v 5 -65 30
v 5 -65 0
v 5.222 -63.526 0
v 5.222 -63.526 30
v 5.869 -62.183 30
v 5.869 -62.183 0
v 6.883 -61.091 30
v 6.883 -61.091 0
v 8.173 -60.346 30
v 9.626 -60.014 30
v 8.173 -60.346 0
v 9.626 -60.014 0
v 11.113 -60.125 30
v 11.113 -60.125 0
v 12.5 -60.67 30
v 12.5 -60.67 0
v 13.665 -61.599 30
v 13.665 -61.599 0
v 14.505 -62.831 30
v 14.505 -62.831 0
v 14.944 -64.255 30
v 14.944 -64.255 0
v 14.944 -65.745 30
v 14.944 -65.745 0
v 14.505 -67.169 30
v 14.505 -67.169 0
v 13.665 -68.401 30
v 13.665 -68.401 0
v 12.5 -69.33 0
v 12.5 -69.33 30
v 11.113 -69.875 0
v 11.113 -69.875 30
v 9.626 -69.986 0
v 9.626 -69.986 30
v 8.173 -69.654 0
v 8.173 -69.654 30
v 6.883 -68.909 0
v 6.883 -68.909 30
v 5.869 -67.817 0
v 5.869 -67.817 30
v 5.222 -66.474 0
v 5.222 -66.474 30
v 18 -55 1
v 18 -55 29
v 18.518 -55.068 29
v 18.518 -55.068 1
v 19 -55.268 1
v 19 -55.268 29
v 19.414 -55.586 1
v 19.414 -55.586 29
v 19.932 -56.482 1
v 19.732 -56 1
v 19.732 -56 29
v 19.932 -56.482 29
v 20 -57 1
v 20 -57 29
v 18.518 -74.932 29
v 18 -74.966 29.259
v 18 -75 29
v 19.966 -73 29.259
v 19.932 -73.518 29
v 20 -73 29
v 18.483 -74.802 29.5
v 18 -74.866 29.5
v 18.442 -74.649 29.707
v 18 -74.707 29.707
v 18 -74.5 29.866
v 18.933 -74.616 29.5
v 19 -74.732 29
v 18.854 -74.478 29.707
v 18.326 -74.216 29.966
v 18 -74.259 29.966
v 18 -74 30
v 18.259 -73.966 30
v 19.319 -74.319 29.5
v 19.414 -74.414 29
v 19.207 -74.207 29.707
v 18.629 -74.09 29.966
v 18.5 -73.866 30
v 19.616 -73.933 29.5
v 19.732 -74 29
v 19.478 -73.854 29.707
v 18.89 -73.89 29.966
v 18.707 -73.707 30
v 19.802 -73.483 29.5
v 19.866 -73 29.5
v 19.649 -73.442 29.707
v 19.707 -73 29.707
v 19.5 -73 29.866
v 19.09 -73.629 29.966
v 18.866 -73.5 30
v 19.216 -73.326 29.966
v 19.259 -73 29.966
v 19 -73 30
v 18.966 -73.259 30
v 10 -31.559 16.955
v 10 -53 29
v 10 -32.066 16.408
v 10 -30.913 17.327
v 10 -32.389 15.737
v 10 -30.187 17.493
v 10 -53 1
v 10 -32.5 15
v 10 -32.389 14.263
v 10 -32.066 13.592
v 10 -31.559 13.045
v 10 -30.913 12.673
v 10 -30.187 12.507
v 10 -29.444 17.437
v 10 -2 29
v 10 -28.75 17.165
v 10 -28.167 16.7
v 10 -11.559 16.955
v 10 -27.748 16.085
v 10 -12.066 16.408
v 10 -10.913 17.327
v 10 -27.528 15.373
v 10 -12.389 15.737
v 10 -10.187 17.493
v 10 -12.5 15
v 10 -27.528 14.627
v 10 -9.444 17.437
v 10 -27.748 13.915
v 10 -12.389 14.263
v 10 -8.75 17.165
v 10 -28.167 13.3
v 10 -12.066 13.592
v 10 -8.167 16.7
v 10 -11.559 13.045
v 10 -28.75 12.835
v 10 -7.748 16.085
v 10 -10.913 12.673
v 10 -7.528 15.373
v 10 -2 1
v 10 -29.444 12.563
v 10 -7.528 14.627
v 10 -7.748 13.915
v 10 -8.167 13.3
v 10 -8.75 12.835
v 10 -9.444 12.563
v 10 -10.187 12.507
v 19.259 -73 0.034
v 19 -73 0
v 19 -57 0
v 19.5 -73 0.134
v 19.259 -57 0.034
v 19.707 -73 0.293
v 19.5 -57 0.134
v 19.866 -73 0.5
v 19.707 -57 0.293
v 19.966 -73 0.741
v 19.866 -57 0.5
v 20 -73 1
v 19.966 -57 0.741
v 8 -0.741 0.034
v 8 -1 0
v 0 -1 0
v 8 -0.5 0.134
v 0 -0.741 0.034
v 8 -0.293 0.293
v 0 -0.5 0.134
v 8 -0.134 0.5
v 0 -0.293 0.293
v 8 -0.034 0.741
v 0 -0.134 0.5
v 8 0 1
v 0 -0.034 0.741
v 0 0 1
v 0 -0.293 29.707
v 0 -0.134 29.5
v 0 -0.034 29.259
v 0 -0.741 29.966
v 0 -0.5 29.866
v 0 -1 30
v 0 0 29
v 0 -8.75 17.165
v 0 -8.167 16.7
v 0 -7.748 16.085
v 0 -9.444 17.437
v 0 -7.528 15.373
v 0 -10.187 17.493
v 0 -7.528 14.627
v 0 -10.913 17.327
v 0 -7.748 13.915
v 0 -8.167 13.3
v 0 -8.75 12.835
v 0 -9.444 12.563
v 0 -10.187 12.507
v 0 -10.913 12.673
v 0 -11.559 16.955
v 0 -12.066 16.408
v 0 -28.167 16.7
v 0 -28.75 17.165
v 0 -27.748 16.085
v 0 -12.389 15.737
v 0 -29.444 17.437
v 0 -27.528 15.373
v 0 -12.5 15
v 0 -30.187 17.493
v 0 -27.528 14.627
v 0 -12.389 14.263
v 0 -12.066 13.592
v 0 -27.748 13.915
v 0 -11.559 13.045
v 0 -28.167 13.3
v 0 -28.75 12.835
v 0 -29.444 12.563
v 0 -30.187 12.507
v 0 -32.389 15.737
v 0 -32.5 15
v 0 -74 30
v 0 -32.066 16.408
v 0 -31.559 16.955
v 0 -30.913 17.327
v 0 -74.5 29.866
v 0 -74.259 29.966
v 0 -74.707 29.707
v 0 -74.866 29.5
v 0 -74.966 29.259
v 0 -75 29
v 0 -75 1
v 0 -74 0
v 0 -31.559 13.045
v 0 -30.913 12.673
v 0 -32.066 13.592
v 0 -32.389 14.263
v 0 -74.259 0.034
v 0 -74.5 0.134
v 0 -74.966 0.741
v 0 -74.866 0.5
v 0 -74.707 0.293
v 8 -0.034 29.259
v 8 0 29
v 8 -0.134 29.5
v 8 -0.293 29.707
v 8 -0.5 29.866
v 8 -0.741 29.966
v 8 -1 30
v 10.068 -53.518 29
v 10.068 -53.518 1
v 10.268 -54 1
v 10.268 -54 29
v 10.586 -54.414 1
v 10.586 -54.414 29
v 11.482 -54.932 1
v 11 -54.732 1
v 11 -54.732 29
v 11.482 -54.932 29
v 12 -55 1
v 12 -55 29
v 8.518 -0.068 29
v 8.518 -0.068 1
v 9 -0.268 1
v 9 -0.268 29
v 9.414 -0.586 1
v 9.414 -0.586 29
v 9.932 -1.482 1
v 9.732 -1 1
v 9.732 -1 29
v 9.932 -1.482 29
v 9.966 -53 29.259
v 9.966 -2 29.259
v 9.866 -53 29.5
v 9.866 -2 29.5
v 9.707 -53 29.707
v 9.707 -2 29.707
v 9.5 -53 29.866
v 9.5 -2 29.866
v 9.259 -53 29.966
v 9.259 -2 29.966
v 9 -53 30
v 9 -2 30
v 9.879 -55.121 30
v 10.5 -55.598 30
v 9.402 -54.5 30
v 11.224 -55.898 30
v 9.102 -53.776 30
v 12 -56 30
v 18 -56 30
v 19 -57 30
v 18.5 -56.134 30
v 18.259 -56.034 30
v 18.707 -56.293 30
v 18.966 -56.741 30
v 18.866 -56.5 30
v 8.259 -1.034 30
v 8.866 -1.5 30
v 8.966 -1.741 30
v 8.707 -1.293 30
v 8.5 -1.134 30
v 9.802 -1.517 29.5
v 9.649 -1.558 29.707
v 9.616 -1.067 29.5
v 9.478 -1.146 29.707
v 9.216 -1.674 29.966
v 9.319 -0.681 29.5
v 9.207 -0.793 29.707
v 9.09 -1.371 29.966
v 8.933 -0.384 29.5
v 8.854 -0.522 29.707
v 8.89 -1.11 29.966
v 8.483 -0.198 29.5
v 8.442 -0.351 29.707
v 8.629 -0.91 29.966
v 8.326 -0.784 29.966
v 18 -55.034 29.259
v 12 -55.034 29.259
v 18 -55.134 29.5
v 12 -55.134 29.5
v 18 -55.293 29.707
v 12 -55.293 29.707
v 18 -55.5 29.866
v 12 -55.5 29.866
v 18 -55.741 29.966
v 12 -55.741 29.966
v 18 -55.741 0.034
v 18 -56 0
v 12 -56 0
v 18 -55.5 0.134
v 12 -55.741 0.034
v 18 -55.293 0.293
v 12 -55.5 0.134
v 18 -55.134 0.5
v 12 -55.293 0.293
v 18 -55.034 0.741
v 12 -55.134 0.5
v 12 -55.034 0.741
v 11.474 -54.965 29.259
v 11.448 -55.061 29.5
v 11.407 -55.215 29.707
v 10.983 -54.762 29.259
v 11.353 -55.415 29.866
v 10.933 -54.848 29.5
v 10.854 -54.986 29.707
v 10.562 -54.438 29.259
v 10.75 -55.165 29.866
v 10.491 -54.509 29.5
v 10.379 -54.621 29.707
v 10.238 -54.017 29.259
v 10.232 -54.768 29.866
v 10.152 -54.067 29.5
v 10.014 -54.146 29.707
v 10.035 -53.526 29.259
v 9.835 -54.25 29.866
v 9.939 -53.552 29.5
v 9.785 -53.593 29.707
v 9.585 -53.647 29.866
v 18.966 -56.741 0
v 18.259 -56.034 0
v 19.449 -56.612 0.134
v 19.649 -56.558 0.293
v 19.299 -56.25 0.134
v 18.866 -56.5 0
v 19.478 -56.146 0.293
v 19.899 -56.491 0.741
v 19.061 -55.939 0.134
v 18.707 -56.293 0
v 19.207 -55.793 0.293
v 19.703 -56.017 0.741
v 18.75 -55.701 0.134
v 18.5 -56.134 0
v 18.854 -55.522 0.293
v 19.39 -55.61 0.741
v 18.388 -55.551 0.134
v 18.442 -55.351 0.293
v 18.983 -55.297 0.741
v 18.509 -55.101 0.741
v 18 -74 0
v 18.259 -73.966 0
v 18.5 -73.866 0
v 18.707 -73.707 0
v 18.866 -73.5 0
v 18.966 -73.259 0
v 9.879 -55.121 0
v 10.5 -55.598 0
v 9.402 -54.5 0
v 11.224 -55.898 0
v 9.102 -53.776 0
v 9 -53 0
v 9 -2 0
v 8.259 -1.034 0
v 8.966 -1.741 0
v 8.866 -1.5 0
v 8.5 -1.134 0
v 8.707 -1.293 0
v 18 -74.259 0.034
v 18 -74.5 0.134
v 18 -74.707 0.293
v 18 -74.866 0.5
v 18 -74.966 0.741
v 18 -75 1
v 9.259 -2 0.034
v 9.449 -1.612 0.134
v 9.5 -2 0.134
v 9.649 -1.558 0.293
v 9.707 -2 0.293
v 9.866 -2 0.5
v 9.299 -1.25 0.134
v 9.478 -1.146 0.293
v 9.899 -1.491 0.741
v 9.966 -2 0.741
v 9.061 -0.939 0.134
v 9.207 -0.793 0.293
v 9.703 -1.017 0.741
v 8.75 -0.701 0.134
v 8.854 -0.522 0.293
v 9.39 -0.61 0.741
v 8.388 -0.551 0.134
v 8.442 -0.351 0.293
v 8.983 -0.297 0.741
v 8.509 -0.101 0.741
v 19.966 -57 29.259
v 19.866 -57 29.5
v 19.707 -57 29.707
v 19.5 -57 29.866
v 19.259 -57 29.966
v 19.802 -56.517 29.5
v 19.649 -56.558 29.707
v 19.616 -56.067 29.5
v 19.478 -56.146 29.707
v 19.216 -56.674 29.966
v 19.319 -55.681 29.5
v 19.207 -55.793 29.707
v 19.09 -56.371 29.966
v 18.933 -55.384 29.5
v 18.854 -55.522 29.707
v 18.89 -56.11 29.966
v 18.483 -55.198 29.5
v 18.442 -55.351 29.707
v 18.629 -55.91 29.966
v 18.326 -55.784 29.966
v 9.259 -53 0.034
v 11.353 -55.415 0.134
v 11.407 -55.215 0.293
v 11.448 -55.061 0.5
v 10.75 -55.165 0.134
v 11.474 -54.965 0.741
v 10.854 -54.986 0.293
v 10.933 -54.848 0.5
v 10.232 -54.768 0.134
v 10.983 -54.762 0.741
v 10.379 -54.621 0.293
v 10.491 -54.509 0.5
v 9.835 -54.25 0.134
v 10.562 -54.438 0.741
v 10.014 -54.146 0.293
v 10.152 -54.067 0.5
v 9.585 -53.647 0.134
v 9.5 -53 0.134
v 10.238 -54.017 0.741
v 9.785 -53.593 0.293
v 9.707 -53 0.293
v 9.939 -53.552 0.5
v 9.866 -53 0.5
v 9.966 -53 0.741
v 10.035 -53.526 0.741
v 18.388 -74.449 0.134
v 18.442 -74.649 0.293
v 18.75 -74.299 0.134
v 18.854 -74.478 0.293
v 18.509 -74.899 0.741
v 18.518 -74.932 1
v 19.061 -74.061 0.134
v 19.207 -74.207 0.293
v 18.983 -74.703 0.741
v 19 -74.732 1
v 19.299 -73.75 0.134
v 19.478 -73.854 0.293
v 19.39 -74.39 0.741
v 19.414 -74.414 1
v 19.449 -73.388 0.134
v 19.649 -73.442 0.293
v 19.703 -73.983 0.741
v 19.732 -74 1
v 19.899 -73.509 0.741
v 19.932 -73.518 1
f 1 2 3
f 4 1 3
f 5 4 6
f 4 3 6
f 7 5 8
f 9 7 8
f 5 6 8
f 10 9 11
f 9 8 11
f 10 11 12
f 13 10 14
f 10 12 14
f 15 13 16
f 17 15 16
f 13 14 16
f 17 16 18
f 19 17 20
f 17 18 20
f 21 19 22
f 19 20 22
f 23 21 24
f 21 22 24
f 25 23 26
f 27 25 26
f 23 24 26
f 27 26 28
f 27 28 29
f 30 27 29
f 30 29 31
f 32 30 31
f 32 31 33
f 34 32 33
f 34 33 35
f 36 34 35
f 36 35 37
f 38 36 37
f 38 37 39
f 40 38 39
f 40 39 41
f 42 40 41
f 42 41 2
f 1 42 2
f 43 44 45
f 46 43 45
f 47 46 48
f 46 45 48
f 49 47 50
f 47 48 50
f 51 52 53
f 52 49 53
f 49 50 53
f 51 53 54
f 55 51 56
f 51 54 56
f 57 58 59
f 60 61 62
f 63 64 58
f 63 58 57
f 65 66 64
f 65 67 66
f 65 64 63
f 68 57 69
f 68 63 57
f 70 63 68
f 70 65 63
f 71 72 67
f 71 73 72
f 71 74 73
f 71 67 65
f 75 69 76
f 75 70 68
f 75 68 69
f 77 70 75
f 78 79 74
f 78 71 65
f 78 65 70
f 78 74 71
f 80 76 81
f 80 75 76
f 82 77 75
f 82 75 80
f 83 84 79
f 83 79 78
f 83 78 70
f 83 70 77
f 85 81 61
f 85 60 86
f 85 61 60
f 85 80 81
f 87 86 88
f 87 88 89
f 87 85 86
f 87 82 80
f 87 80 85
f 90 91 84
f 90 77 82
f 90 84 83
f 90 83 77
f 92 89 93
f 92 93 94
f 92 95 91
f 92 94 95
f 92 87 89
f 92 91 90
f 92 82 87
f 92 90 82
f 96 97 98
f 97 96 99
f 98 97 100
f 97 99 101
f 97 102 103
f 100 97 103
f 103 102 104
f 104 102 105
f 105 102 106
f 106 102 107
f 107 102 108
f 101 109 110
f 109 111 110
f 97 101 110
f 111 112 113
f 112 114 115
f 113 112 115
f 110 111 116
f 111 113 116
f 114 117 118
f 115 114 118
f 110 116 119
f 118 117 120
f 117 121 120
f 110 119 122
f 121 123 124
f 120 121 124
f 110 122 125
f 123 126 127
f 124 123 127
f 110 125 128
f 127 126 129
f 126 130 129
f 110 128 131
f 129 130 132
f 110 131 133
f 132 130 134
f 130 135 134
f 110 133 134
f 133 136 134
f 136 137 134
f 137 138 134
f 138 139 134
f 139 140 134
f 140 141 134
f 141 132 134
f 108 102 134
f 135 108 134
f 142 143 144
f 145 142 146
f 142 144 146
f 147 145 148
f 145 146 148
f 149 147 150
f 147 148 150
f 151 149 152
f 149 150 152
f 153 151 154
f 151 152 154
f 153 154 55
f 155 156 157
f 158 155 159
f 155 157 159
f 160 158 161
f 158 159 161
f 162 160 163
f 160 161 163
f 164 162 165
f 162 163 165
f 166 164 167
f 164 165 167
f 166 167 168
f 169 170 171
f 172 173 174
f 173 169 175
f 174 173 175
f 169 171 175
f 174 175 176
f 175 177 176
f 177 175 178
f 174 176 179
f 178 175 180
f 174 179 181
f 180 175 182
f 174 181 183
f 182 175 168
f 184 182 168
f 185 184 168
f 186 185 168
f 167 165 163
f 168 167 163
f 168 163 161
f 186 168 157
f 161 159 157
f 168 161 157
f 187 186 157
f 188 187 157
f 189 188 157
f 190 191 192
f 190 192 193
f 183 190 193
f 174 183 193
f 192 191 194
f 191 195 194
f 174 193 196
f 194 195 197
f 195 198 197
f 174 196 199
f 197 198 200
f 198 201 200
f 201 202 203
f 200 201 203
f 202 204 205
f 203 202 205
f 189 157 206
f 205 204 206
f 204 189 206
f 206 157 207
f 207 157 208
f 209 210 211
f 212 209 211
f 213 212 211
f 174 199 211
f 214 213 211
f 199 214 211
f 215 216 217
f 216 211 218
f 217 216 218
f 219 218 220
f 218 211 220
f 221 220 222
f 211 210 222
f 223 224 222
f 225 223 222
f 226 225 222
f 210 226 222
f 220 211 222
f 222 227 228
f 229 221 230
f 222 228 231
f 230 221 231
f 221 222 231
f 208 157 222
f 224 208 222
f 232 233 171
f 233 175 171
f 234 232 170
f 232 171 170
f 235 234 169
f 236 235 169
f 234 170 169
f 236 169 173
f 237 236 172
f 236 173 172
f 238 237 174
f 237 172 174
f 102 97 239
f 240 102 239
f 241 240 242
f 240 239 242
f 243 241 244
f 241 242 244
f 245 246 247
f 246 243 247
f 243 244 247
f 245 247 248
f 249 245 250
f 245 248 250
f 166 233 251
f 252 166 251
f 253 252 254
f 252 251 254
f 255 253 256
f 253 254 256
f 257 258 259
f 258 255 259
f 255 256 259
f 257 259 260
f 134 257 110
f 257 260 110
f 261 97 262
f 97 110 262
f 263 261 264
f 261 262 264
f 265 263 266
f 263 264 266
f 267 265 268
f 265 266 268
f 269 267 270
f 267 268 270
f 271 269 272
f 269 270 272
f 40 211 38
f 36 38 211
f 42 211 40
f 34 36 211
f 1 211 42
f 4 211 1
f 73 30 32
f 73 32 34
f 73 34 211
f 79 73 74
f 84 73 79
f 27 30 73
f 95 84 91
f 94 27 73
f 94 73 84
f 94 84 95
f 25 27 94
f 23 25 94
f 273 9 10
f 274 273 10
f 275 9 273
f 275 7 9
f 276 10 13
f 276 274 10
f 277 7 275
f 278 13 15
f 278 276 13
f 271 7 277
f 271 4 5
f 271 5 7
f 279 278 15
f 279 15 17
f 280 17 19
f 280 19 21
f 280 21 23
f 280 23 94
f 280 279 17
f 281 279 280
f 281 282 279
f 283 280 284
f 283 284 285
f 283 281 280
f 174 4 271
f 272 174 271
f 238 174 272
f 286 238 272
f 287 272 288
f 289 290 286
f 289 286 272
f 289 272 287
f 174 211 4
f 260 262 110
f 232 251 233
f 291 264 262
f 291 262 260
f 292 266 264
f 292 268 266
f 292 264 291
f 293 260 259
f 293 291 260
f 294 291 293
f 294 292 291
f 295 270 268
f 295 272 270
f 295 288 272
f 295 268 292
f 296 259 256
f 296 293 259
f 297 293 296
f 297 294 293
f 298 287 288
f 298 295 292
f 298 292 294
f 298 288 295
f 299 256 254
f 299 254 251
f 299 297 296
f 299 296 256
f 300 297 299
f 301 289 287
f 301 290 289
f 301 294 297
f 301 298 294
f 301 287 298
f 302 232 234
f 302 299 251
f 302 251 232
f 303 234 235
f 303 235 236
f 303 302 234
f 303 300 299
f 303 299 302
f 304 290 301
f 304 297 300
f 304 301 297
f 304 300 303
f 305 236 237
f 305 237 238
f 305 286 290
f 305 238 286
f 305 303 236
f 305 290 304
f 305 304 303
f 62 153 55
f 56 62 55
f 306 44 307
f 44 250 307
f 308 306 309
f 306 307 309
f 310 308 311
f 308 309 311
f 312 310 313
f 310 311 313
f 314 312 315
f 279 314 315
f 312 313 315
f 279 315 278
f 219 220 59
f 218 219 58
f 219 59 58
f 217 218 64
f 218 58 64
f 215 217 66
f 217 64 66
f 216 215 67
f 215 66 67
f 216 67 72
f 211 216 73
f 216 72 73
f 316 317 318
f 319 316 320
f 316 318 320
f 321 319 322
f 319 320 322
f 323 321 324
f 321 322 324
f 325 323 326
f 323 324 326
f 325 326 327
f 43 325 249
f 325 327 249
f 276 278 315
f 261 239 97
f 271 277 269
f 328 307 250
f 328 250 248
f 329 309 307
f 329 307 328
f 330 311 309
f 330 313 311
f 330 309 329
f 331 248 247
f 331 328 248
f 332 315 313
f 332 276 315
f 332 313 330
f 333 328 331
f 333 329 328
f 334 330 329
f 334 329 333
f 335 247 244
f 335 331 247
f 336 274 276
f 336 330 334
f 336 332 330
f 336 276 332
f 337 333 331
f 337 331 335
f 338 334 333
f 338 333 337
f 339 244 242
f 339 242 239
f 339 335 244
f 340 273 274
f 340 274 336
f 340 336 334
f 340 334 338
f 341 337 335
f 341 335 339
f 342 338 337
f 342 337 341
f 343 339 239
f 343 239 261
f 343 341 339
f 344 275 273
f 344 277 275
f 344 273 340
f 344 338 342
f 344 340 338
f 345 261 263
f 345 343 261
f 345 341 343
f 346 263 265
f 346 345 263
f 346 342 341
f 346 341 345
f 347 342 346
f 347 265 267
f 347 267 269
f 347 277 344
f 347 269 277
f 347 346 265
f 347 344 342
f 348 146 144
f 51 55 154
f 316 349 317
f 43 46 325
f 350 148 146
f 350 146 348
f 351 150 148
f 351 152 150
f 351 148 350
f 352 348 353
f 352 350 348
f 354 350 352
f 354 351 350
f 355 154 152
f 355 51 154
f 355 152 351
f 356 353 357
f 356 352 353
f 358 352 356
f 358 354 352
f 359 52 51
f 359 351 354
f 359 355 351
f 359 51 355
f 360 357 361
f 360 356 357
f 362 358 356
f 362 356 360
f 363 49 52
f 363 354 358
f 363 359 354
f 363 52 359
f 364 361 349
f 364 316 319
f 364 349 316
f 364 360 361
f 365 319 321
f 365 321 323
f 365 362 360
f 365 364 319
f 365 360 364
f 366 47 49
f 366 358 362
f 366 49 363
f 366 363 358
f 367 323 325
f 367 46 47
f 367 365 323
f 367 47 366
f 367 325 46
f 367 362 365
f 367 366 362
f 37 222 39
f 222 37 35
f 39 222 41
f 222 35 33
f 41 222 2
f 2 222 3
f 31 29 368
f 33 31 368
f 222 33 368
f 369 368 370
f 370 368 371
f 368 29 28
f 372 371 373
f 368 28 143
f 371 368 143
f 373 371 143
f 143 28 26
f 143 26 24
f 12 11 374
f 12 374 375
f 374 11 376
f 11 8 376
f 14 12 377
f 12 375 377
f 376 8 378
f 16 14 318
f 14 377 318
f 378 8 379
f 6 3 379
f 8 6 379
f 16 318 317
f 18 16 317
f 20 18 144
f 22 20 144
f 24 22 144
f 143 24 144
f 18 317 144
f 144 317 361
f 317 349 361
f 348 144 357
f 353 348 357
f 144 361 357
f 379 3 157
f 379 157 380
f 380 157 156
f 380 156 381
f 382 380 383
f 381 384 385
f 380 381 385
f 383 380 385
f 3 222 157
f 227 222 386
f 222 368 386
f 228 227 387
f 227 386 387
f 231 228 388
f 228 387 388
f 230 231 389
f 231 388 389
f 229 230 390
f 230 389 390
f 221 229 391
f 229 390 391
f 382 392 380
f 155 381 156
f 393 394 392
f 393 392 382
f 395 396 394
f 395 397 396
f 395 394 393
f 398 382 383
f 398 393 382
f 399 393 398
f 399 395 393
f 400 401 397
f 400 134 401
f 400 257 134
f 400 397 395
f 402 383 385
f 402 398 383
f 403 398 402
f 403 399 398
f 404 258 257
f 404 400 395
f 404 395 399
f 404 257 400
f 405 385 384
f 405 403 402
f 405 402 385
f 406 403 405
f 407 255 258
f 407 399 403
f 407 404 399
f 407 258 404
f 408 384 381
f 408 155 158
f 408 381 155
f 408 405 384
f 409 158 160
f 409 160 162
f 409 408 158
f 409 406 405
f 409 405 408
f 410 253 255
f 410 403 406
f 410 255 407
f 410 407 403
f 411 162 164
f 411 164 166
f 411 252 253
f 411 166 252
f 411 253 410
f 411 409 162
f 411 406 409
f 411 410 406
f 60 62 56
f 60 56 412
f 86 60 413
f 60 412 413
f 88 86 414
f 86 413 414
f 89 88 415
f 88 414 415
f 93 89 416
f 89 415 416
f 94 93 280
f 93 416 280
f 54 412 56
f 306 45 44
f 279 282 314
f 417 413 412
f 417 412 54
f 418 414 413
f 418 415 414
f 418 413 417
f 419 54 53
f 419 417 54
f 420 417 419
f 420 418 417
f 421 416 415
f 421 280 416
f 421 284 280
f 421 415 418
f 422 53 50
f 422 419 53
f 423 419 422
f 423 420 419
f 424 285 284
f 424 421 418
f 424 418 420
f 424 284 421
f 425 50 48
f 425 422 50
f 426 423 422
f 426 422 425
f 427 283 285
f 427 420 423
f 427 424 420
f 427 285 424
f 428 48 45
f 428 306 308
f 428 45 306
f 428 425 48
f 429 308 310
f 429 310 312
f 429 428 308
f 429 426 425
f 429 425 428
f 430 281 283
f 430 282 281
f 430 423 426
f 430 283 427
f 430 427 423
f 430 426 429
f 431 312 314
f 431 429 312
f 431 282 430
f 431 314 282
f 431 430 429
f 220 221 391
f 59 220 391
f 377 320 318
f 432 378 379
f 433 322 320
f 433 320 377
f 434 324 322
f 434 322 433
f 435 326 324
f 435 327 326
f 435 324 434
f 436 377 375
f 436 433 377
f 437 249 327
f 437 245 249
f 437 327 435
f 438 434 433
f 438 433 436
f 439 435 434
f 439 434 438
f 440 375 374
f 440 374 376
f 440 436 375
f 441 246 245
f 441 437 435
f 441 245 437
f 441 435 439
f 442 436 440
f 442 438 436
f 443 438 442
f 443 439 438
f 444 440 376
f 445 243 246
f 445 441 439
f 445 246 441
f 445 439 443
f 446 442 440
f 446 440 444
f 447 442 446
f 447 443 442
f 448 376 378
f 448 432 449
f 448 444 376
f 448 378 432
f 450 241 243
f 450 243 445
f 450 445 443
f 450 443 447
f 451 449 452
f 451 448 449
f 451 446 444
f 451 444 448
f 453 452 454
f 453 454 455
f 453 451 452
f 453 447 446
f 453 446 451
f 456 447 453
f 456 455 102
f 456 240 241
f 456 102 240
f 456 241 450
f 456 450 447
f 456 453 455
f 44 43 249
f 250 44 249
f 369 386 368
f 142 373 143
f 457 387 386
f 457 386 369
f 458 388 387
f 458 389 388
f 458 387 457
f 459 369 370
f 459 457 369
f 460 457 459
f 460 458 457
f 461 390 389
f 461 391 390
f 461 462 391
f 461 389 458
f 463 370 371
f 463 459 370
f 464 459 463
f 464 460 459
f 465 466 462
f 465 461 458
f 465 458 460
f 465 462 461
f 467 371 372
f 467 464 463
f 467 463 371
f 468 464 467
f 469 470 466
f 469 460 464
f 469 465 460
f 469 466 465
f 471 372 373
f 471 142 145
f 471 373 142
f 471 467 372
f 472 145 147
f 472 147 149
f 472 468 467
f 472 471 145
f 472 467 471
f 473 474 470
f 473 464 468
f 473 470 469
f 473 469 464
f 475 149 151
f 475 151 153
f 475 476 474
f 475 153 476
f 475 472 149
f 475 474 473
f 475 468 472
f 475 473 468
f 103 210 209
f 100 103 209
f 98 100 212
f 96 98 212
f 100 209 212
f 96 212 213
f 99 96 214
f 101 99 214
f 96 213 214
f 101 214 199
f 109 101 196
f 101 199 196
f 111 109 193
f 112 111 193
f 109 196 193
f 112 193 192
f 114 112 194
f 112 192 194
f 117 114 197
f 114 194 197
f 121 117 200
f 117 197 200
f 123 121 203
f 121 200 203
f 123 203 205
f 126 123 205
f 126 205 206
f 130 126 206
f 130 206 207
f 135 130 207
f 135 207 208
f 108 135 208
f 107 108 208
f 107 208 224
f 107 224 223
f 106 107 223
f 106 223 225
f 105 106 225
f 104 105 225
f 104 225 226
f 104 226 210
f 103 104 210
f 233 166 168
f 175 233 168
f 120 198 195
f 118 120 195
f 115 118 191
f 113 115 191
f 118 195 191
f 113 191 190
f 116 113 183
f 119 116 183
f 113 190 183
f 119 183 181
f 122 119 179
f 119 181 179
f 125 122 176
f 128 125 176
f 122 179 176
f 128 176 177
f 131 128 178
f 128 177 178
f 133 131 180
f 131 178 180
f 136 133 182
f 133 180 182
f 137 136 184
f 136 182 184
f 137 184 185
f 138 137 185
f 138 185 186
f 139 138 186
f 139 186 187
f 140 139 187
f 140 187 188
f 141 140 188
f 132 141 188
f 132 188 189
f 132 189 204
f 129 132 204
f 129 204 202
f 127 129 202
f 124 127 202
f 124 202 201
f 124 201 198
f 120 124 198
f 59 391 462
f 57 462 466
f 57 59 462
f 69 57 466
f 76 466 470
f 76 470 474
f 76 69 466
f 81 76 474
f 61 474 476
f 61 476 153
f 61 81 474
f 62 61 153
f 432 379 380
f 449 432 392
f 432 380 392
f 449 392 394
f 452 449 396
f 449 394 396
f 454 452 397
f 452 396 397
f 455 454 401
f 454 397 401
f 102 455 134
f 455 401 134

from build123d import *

# Parameters (mm, degrees)
F1_DEPTH = 30
F3_D     = 10
F5_D     = 5
F7_D     = 5
F8_R     = 2
F9_R     = 1


with BuildPart() as f1:
    # F0 (on Top) → F1 (new body)
    with BuildSketch(Plane.XY):
        Polygon((10, 0), (0, 0), (0, -75), (20, -75), (20, -55), (10, -55), align=None)
    extrude(amount=F1_DEPTH)

    # F3 (through all)
    with Locations(Plane.XY.offset(30)):
        with Locations((10, -65)):
            Hole(F3_D / 2)

    # F5 (through all)
    with Locations(Plane.YZ.offset(10)):
        with Locations((-10, 15)):
            Hole(F5_D / 2)

    # F7 (through all)
    with Locations(Plane.YZ.offset(10)):
        with Locations((-30, 15)):
            Hole(F7_D / 2)

    # F8
    f8_edges = [f1.edges().sort_by_distance(p)[0] for p in [
        (10, 0, 15),
        (20, -55, 15),
        (10, -55, 15),
        (20, -75, 15),
    ]]
    fillet(f8_edges, radius=F8_R)

    # F9
    f9_edges = [f1.edges().sort_by_distance(p)[0] for p in [
        (4, 0, 30),
        (10, -27.5, 0),
    ]]
    fillet(f9_edges, radius=F9_R)


solid = f1.part
